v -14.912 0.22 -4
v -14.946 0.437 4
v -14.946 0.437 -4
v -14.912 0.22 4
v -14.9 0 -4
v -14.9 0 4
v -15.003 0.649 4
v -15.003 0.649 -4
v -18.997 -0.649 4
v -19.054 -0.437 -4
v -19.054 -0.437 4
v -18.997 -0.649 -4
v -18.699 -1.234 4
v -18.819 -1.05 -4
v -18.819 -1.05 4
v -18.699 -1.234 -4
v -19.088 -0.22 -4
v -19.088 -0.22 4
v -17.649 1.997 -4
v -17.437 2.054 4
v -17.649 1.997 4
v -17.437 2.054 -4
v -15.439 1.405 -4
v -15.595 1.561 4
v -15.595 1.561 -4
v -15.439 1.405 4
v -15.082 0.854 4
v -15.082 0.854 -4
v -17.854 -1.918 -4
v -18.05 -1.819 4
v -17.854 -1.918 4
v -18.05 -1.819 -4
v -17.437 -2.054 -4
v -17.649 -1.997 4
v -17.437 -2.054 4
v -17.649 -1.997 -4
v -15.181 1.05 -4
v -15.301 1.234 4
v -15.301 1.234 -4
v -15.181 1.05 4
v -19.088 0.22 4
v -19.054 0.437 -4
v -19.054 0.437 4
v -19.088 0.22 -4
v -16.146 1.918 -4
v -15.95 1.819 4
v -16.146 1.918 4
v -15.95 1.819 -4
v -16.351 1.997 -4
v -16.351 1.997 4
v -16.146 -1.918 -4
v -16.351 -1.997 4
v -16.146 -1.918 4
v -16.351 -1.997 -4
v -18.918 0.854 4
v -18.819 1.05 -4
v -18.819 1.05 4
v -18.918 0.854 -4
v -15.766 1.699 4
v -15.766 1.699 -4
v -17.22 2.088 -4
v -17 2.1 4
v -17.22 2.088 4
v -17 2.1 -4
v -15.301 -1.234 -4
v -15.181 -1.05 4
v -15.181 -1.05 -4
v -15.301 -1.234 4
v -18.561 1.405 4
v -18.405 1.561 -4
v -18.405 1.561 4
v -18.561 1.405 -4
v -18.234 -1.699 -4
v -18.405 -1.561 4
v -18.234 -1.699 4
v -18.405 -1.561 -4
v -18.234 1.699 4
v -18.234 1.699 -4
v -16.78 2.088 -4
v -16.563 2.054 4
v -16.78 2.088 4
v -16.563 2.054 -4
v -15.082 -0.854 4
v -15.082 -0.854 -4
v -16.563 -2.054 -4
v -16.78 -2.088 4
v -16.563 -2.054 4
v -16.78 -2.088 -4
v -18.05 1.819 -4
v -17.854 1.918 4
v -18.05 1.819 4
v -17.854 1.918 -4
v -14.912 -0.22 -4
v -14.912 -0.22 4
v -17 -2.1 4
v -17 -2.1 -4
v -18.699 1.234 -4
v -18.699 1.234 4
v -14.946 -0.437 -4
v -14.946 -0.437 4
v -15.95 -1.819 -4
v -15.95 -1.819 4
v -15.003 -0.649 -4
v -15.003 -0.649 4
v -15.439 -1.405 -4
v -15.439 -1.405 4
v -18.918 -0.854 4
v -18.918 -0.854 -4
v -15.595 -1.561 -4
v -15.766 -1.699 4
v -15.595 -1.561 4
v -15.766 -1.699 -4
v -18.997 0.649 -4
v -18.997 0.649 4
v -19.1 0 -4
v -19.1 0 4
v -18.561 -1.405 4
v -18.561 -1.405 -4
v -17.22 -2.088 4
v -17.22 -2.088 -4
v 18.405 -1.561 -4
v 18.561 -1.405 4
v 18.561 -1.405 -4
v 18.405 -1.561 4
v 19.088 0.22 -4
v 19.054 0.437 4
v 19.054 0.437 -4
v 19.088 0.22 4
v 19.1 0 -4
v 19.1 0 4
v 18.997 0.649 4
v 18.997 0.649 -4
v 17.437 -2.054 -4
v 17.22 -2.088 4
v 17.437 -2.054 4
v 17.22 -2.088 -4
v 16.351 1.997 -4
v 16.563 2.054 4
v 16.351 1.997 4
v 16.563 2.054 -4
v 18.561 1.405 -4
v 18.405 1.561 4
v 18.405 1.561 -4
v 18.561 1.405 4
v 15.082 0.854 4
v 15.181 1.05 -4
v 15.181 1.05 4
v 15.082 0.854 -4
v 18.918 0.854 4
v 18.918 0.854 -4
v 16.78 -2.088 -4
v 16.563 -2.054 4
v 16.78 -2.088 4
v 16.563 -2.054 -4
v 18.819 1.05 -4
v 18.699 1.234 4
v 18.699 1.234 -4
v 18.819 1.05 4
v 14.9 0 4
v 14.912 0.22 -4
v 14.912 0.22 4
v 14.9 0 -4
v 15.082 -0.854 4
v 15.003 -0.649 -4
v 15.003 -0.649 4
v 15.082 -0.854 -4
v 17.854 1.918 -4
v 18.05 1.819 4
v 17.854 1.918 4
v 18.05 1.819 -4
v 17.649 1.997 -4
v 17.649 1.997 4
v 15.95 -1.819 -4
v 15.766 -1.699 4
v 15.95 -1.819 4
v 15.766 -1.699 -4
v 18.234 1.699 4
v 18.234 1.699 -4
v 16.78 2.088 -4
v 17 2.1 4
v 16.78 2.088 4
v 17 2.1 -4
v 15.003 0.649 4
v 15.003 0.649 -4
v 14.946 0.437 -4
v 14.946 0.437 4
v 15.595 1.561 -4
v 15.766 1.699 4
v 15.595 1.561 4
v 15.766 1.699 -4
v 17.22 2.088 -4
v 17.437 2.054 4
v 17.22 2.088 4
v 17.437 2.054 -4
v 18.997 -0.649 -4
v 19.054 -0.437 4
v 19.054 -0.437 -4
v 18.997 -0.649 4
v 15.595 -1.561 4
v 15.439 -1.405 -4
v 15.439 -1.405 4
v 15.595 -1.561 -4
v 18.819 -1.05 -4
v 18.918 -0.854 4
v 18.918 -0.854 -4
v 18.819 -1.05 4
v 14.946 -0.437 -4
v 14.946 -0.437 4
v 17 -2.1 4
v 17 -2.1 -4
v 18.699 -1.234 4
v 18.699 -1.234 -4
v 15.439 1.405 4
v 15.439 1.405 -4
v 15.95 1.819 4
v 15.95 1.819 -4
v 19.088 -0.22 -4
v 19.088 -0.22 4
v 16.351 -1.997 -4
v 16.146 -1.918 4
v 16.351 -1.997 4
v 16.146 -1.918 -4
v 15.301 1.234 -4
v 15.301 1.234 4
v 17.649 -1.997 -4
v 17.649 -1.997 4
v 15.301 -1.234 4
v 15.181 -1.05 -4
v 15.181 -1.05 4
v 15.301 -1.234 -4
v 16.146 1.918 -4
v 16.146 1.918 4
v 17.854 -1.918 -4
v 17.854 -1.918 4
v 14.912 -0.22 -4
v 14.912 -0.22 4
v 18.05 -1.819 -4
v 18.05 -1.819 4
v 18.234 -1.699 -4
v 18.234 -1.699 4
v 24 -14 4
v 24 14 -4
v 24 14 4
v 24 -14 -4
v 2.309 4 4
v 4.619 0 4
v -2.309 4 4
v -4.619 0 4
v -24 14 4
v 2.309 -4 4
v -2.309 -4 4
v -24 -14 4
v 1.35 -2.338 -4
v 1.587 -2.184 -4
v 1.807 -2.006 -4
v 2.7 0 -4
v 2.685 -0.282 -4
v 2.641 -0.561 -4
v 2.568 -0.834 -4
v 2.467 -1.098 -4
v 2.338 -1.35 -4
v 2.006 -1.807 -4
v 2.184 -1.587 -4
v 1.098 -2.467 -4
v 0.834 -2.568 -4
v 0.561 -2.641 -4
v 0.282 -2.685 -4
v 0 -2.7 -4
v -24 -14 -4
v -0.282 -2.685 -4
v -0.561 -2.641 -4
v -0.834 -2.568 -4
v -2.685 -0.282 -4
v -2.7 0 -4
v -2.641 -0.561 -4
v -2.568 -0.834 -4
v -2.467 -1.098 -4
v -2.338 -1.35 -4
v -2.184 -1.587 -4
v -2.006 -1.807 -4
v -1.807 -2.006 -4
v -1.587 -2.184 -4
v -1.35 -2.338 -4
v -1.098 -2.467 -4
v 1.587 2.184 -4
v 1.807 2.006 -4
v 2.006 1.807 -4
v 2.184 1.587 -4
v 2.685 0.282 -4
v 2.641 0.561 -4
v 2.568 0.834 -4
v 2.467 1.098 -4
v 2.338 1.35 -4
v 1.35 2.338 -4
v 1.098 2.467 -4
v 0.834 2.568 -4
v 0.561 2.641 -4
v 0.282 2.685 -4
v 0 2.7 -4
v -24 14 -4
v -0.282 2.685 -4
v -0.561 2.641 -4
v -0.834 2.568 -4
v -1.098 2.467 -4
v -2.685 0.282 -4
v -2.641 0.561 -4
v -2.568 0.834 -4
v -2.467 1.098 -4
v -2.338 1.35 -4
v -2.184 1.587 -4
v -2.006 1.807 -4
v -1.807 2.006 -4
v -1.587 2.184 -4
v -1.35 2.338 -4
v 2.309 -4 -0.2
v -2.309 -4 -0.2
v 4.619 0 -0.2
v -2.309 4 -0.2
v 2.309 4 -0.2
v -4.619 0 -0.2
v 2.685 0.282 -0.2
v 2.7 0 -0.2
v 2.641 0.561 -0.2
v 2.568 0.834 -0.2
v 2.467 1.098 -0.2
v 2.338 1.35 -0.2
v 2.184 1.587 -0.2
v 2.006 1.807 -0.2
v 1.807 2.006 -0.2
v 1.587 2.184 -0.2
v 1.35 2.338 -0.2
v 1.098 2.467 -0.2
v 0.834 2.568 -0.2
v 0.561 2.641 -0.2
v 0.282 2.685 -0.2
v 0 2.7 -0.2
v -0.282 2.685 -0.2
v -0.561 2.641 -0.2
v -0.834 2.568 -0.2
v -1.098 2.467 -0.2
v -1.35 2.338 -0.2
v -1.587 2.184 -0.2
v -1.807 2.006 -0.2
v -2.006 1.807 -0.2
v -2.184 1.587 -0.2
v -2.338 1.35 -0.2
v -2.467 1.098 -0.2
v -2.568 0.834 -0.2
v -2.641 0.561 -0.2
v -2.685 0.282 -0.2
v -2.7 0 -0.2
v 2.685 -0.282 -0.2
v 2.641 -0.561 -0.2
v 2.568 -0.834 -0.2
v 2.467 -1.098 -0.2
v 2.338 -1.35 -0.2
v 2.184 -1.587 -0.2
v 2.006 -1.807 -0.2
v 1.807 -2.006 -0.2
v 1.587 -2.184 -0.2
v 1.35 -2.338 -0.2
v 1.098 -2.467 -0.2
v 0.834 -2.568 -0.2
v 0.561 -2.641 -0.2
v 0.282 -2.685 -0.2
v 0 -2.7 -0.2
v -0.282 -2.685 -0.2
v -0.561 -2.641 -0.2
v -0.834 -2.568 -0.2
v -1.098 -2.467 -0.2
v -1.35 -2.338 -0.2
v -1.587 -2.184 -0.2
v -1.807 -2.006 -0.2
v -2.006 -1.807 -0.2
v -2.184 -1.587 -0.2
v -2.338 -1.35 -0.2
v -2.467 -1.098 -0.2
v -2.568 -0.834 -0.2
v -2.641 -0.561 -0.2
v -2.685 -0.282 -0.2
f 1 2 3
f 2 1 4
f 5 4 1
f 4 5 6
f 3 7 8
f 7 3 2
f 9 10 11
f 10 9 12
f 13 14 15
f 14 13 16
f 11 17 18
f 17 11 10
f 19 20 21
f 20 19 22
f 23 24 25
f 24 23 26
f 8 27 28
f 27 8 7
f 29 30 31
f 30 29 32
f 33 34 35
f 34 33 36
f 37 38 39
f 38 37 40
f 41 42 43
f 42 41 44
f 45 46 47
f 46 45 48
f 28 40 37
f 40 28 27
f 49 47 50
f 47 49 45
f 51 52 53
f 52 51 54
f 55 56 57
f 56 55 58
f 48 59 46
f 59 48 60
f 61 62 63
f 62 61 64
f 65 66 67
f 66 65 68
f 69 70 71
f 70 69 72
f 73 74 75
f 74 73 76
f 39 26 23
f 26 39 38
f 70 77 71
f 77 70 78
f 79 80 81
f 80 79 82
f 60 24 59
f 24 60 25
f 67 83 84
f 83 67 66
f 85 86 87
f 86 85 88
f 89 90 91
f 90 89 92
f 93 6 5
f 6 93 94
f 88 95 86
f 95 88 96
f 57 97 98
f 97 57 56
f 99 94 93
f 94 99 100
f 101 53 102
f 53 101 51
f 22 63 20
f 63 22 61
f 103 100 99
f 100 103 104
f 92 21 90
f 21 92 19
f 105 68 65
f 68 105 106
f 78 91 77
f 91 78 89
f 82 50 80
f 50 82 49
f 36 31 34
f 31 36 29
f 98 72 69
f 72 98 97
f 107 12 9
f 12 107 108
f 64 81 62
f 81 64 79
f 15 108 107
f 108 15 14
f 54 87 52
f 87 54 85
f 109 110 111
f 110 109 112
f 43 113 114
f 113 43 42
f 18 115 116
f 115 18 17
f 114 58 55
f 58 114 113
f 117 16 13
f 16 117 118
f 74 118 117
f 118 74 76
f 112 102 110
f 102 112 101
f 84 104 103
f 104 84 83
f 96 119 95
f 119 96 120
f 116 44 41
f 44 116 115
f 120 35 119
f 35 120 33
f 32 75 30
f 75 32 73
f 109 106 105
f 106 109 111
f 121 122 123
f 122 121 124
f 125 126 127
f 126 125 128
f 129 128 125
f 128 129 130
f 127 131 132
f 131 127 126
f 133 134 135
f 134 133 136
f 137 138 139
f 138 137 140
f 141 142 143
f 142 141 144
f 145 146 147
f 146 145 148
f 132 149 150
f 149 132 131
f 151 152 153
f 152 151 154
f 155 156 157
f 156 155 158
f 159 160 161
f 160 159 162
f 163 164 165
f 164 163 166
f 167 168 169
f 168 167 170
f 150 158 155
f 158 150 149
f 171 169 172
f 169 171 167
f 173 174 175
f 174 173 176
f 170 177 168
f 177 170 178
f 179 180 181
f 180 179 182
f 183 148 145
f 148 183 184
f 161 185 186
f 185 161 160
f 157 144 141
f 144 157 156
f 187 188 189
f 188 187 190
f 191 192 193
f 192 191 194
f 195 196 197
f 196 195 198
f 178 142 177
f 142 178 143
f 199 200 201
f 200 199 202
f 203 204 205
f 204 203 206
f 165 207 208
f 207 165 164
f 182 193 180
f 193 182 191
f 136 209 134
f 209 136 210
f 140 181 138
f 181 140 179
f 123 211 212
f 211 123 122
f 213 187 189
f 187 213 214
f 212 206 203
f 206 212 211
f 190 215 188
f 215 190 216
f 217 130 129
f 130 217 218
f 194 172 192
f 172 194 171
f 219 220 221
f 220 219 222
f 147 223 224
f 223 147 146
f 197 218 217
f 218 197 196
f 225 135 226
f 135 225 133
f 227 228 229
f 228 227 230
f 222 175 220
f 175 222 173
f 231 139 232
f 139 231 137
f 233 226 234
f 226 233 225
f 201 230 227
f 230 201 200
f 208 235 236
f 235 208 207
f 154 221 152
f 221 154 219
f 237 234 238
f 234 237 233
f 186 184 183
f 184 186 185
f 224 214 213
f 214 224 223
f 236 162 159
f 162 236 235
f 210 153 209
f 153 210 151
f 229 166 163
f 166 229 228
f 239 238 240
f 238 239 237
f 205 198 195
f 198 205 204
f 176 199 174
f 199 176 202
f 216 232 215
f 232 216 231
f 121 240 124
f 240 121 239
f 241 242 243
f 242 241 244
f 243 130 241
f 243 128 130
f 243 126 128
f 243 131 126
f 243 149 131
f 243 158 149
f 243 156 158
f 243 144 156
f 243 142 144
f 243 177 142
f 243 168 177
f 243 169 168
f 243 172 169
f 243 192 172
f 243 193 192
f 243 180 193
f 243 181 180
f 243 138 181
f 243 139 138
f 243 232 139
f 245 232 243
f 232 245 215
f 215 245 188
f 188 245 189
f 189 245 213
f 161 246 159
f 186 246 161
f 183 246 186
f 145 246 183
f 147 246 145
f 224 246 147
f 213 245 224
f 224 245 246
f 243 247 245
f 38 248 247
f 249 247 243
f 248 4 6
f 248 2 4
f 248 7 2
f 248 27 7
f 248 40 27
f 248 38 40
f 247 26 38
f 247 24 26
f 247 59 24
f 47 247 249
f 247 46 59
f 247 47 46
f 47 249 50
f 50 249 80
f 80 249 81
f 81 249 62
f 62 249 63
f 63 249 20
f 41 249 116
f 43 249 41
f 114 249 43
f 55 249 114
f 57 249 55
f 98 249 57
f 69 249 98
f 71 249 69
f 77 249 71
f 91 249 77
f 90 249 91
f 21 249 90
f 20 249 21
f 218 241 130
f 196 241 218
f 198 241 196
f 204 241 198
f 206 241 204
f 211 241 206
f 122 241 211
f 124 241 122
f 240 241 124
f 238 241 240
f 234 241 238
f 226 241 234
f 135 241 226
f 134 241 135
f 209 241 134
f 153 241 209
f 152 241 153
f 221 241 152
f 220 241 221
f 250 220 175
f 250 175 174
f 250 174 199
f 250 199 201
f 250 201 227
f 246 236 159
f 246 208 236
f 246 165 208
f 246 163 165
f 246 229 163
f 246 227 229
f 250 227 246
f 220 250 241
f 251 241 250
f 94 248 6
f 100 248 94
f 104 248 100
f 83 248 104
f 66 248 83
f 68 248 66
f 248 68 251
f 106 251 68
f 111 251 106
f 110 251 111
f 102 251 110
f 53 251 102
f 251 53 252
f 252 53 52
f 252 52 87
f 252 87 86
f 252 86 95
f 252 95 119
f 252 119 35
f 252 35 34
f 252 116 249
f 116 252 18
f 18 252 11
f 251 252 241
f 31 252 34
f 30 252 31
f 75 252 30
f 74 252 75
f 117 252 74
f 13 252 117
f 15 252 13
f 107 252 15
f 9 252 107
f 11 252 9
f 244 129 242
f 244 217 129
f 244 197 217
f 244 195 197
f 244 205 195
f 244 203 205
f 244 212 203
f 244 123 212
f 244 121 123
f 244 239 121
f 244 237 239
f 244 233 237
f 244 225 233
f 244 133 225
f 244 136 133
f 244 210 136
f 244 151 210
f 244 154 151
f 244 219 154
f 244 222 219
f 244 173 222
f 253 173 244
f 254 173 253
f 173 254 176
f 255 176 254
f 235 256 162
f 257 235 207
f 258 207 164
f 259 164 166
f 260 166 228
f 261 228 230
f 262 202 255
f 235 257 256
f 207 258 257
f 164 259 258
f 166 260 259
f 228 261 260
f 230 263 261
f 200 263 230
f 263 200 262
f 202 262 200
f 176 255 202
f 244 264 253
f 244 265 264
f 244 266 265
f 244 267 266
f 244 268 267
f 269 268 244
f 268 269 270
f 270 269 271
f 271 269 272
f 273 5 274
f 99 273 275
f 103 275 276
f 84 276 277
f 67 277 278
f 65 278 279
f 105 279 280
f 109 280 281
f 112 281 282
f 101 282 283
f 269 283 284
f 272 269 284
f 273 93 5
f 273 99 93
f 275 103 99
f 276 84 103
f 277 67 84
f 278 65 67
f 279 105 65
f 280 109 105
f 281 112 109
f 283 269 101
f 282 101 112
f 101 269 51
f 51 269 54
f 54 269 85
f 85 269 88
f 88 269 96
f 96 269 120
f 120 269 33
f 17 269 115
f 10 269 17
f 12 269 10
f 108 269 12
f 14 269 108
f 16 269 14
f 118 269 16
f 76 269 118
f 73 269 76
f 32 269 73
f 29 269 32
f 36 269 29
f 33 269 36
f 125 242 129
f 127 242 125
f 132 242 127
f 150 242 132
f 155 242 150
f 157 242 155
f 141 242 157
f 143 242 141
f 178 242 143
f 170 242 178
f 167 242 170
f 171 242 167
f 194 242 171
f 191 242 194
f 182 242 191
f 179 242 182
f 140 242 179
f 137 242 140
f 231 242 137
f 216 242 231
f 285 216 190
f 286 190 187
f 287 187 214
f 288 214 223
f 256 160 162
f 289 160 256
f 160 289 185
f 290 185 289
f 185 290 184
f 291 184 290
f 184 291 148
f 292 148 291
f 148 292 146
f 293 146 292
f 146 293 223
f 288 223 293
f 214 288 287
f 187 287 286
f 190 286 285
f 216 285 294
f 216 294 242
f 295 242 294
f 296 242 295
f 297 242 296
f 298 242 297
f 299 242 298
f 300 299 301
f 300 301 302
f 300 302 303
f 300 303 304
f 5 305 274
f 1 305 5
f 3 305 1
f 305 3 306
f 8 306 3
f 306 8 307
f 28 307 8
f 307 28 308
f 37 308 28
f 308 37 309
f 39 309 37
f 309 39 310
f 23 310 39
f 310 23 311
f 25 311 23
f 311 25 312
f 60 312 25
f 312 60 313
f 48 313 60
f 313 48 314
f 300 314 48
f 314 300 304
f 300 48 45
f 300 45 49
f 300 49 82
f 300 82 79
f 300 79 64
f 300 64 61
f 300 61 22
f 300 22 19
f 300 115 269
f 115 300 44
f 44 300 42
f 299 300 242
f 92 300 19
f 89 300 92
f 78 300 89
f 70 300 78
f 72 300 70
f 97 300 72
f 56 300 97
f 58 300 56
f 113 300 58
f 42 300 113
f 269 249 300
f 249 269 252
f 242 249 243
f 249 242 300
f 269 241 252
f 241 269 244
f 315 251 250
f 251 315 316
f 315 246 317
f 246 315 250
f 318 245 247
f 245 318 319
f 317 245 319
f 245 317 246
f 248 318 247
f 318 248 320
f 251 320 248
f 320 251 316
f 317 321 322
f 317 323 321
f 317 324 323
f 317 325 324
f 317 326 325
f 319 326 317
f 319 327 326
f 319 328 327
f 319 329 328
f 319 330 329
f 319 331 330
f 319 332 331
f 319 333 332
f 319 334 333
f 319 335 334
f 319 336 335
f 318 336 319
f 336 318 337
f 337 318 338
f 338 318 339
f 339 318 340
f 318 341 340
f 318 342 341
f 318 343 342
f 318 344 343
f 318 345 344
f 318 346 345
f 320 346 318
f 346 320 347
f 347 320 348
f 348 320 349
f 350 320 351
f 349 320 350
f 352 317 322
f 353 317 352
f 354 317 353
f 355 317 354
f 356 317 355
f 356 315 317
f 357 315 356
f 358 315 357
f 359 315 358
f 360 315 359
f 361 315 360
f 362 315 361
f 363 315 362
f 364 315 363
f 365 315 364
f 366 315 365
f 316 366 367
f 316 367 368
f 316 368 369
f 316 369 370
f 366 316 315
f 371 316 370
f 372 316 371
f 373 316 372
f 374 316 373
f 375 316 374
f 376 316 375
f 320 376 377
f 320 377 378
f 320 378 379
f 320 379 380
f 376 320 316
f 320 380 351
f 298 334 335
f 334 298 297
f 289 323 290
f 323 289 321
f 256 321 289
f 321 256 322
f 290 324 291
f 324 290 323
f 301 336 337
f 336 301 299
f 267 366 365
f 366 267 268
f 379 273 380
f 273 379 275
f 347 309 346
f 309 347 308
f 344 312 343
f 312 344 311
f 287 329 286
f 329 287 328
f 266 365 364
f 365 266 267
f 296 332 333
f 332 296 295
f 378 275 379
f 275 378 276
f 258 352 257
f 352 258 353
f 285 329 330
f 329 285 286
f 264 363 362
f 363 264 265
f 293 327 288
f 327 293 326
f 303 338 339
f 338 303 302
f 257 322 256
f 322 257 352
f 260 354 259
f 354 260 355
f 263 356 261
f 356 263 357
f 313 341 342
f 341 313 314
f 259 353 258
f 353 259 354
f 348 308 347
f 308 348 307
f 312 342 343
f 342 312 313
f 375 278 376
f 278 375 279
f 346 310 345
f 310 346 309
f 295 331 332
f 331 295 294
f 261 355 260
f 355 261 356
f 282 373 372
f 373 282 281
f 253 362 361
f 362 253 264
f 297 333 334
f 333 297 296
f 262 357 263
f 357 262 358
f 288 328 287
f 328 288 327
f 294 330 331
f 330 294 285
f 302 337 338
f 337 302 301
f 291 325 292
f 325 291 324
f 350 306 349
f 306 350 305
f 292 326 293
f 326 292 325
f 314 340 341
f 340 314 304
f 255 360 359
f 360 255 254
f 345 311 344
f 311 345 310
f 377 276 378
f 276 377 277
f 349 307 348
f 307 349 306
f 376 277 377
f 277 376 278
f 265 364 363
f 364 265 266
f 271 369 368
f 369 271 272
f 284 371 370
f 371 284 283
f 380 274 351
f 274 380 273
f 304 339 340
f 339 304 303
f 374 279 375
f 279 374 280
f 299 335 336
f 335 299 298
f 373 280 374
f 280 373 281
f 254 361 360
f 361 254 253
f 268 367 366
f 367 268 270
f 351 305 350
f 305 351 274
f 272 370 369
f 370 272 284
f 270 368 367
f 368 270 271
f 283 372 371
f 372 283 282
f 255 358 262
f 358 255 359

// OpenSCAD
// M5 captive-nut plate: captive hex-nut mounting plate.
$fn = 60;
eps = 0.02;
plate_l = 48;
plate_w = 28;
plate_t = 8;
mount_pitch = 34;
mount_d = 4.2;
nut_flat = 8.0;
nut_depth = 4.2;
thread_clearance_d = 5.4;

// The hex pocket leaves at least 3.8 mm of material below the nut.
difference() {
    cube([plate_l, plate_w, plate_t], center = true);
    for (x = [-mount_pitch / 2, mount_pitch / 2])
        translate([x, 0, -plate_t / 2 - eps]) cylinder(d = mount_d, h = plate_t + 2 * eps);
    translate([0, 0, plate_t / 2 - nut_depth])
        cylinder(d = nut_flat / cos(30), h = nut_depth + eps, $fn = 6);
    translate([0, 0, -plate_t / 2 - eps])
        cylinder(d = thread_clearance_d, h = plate_t + 2 * eps);
}
